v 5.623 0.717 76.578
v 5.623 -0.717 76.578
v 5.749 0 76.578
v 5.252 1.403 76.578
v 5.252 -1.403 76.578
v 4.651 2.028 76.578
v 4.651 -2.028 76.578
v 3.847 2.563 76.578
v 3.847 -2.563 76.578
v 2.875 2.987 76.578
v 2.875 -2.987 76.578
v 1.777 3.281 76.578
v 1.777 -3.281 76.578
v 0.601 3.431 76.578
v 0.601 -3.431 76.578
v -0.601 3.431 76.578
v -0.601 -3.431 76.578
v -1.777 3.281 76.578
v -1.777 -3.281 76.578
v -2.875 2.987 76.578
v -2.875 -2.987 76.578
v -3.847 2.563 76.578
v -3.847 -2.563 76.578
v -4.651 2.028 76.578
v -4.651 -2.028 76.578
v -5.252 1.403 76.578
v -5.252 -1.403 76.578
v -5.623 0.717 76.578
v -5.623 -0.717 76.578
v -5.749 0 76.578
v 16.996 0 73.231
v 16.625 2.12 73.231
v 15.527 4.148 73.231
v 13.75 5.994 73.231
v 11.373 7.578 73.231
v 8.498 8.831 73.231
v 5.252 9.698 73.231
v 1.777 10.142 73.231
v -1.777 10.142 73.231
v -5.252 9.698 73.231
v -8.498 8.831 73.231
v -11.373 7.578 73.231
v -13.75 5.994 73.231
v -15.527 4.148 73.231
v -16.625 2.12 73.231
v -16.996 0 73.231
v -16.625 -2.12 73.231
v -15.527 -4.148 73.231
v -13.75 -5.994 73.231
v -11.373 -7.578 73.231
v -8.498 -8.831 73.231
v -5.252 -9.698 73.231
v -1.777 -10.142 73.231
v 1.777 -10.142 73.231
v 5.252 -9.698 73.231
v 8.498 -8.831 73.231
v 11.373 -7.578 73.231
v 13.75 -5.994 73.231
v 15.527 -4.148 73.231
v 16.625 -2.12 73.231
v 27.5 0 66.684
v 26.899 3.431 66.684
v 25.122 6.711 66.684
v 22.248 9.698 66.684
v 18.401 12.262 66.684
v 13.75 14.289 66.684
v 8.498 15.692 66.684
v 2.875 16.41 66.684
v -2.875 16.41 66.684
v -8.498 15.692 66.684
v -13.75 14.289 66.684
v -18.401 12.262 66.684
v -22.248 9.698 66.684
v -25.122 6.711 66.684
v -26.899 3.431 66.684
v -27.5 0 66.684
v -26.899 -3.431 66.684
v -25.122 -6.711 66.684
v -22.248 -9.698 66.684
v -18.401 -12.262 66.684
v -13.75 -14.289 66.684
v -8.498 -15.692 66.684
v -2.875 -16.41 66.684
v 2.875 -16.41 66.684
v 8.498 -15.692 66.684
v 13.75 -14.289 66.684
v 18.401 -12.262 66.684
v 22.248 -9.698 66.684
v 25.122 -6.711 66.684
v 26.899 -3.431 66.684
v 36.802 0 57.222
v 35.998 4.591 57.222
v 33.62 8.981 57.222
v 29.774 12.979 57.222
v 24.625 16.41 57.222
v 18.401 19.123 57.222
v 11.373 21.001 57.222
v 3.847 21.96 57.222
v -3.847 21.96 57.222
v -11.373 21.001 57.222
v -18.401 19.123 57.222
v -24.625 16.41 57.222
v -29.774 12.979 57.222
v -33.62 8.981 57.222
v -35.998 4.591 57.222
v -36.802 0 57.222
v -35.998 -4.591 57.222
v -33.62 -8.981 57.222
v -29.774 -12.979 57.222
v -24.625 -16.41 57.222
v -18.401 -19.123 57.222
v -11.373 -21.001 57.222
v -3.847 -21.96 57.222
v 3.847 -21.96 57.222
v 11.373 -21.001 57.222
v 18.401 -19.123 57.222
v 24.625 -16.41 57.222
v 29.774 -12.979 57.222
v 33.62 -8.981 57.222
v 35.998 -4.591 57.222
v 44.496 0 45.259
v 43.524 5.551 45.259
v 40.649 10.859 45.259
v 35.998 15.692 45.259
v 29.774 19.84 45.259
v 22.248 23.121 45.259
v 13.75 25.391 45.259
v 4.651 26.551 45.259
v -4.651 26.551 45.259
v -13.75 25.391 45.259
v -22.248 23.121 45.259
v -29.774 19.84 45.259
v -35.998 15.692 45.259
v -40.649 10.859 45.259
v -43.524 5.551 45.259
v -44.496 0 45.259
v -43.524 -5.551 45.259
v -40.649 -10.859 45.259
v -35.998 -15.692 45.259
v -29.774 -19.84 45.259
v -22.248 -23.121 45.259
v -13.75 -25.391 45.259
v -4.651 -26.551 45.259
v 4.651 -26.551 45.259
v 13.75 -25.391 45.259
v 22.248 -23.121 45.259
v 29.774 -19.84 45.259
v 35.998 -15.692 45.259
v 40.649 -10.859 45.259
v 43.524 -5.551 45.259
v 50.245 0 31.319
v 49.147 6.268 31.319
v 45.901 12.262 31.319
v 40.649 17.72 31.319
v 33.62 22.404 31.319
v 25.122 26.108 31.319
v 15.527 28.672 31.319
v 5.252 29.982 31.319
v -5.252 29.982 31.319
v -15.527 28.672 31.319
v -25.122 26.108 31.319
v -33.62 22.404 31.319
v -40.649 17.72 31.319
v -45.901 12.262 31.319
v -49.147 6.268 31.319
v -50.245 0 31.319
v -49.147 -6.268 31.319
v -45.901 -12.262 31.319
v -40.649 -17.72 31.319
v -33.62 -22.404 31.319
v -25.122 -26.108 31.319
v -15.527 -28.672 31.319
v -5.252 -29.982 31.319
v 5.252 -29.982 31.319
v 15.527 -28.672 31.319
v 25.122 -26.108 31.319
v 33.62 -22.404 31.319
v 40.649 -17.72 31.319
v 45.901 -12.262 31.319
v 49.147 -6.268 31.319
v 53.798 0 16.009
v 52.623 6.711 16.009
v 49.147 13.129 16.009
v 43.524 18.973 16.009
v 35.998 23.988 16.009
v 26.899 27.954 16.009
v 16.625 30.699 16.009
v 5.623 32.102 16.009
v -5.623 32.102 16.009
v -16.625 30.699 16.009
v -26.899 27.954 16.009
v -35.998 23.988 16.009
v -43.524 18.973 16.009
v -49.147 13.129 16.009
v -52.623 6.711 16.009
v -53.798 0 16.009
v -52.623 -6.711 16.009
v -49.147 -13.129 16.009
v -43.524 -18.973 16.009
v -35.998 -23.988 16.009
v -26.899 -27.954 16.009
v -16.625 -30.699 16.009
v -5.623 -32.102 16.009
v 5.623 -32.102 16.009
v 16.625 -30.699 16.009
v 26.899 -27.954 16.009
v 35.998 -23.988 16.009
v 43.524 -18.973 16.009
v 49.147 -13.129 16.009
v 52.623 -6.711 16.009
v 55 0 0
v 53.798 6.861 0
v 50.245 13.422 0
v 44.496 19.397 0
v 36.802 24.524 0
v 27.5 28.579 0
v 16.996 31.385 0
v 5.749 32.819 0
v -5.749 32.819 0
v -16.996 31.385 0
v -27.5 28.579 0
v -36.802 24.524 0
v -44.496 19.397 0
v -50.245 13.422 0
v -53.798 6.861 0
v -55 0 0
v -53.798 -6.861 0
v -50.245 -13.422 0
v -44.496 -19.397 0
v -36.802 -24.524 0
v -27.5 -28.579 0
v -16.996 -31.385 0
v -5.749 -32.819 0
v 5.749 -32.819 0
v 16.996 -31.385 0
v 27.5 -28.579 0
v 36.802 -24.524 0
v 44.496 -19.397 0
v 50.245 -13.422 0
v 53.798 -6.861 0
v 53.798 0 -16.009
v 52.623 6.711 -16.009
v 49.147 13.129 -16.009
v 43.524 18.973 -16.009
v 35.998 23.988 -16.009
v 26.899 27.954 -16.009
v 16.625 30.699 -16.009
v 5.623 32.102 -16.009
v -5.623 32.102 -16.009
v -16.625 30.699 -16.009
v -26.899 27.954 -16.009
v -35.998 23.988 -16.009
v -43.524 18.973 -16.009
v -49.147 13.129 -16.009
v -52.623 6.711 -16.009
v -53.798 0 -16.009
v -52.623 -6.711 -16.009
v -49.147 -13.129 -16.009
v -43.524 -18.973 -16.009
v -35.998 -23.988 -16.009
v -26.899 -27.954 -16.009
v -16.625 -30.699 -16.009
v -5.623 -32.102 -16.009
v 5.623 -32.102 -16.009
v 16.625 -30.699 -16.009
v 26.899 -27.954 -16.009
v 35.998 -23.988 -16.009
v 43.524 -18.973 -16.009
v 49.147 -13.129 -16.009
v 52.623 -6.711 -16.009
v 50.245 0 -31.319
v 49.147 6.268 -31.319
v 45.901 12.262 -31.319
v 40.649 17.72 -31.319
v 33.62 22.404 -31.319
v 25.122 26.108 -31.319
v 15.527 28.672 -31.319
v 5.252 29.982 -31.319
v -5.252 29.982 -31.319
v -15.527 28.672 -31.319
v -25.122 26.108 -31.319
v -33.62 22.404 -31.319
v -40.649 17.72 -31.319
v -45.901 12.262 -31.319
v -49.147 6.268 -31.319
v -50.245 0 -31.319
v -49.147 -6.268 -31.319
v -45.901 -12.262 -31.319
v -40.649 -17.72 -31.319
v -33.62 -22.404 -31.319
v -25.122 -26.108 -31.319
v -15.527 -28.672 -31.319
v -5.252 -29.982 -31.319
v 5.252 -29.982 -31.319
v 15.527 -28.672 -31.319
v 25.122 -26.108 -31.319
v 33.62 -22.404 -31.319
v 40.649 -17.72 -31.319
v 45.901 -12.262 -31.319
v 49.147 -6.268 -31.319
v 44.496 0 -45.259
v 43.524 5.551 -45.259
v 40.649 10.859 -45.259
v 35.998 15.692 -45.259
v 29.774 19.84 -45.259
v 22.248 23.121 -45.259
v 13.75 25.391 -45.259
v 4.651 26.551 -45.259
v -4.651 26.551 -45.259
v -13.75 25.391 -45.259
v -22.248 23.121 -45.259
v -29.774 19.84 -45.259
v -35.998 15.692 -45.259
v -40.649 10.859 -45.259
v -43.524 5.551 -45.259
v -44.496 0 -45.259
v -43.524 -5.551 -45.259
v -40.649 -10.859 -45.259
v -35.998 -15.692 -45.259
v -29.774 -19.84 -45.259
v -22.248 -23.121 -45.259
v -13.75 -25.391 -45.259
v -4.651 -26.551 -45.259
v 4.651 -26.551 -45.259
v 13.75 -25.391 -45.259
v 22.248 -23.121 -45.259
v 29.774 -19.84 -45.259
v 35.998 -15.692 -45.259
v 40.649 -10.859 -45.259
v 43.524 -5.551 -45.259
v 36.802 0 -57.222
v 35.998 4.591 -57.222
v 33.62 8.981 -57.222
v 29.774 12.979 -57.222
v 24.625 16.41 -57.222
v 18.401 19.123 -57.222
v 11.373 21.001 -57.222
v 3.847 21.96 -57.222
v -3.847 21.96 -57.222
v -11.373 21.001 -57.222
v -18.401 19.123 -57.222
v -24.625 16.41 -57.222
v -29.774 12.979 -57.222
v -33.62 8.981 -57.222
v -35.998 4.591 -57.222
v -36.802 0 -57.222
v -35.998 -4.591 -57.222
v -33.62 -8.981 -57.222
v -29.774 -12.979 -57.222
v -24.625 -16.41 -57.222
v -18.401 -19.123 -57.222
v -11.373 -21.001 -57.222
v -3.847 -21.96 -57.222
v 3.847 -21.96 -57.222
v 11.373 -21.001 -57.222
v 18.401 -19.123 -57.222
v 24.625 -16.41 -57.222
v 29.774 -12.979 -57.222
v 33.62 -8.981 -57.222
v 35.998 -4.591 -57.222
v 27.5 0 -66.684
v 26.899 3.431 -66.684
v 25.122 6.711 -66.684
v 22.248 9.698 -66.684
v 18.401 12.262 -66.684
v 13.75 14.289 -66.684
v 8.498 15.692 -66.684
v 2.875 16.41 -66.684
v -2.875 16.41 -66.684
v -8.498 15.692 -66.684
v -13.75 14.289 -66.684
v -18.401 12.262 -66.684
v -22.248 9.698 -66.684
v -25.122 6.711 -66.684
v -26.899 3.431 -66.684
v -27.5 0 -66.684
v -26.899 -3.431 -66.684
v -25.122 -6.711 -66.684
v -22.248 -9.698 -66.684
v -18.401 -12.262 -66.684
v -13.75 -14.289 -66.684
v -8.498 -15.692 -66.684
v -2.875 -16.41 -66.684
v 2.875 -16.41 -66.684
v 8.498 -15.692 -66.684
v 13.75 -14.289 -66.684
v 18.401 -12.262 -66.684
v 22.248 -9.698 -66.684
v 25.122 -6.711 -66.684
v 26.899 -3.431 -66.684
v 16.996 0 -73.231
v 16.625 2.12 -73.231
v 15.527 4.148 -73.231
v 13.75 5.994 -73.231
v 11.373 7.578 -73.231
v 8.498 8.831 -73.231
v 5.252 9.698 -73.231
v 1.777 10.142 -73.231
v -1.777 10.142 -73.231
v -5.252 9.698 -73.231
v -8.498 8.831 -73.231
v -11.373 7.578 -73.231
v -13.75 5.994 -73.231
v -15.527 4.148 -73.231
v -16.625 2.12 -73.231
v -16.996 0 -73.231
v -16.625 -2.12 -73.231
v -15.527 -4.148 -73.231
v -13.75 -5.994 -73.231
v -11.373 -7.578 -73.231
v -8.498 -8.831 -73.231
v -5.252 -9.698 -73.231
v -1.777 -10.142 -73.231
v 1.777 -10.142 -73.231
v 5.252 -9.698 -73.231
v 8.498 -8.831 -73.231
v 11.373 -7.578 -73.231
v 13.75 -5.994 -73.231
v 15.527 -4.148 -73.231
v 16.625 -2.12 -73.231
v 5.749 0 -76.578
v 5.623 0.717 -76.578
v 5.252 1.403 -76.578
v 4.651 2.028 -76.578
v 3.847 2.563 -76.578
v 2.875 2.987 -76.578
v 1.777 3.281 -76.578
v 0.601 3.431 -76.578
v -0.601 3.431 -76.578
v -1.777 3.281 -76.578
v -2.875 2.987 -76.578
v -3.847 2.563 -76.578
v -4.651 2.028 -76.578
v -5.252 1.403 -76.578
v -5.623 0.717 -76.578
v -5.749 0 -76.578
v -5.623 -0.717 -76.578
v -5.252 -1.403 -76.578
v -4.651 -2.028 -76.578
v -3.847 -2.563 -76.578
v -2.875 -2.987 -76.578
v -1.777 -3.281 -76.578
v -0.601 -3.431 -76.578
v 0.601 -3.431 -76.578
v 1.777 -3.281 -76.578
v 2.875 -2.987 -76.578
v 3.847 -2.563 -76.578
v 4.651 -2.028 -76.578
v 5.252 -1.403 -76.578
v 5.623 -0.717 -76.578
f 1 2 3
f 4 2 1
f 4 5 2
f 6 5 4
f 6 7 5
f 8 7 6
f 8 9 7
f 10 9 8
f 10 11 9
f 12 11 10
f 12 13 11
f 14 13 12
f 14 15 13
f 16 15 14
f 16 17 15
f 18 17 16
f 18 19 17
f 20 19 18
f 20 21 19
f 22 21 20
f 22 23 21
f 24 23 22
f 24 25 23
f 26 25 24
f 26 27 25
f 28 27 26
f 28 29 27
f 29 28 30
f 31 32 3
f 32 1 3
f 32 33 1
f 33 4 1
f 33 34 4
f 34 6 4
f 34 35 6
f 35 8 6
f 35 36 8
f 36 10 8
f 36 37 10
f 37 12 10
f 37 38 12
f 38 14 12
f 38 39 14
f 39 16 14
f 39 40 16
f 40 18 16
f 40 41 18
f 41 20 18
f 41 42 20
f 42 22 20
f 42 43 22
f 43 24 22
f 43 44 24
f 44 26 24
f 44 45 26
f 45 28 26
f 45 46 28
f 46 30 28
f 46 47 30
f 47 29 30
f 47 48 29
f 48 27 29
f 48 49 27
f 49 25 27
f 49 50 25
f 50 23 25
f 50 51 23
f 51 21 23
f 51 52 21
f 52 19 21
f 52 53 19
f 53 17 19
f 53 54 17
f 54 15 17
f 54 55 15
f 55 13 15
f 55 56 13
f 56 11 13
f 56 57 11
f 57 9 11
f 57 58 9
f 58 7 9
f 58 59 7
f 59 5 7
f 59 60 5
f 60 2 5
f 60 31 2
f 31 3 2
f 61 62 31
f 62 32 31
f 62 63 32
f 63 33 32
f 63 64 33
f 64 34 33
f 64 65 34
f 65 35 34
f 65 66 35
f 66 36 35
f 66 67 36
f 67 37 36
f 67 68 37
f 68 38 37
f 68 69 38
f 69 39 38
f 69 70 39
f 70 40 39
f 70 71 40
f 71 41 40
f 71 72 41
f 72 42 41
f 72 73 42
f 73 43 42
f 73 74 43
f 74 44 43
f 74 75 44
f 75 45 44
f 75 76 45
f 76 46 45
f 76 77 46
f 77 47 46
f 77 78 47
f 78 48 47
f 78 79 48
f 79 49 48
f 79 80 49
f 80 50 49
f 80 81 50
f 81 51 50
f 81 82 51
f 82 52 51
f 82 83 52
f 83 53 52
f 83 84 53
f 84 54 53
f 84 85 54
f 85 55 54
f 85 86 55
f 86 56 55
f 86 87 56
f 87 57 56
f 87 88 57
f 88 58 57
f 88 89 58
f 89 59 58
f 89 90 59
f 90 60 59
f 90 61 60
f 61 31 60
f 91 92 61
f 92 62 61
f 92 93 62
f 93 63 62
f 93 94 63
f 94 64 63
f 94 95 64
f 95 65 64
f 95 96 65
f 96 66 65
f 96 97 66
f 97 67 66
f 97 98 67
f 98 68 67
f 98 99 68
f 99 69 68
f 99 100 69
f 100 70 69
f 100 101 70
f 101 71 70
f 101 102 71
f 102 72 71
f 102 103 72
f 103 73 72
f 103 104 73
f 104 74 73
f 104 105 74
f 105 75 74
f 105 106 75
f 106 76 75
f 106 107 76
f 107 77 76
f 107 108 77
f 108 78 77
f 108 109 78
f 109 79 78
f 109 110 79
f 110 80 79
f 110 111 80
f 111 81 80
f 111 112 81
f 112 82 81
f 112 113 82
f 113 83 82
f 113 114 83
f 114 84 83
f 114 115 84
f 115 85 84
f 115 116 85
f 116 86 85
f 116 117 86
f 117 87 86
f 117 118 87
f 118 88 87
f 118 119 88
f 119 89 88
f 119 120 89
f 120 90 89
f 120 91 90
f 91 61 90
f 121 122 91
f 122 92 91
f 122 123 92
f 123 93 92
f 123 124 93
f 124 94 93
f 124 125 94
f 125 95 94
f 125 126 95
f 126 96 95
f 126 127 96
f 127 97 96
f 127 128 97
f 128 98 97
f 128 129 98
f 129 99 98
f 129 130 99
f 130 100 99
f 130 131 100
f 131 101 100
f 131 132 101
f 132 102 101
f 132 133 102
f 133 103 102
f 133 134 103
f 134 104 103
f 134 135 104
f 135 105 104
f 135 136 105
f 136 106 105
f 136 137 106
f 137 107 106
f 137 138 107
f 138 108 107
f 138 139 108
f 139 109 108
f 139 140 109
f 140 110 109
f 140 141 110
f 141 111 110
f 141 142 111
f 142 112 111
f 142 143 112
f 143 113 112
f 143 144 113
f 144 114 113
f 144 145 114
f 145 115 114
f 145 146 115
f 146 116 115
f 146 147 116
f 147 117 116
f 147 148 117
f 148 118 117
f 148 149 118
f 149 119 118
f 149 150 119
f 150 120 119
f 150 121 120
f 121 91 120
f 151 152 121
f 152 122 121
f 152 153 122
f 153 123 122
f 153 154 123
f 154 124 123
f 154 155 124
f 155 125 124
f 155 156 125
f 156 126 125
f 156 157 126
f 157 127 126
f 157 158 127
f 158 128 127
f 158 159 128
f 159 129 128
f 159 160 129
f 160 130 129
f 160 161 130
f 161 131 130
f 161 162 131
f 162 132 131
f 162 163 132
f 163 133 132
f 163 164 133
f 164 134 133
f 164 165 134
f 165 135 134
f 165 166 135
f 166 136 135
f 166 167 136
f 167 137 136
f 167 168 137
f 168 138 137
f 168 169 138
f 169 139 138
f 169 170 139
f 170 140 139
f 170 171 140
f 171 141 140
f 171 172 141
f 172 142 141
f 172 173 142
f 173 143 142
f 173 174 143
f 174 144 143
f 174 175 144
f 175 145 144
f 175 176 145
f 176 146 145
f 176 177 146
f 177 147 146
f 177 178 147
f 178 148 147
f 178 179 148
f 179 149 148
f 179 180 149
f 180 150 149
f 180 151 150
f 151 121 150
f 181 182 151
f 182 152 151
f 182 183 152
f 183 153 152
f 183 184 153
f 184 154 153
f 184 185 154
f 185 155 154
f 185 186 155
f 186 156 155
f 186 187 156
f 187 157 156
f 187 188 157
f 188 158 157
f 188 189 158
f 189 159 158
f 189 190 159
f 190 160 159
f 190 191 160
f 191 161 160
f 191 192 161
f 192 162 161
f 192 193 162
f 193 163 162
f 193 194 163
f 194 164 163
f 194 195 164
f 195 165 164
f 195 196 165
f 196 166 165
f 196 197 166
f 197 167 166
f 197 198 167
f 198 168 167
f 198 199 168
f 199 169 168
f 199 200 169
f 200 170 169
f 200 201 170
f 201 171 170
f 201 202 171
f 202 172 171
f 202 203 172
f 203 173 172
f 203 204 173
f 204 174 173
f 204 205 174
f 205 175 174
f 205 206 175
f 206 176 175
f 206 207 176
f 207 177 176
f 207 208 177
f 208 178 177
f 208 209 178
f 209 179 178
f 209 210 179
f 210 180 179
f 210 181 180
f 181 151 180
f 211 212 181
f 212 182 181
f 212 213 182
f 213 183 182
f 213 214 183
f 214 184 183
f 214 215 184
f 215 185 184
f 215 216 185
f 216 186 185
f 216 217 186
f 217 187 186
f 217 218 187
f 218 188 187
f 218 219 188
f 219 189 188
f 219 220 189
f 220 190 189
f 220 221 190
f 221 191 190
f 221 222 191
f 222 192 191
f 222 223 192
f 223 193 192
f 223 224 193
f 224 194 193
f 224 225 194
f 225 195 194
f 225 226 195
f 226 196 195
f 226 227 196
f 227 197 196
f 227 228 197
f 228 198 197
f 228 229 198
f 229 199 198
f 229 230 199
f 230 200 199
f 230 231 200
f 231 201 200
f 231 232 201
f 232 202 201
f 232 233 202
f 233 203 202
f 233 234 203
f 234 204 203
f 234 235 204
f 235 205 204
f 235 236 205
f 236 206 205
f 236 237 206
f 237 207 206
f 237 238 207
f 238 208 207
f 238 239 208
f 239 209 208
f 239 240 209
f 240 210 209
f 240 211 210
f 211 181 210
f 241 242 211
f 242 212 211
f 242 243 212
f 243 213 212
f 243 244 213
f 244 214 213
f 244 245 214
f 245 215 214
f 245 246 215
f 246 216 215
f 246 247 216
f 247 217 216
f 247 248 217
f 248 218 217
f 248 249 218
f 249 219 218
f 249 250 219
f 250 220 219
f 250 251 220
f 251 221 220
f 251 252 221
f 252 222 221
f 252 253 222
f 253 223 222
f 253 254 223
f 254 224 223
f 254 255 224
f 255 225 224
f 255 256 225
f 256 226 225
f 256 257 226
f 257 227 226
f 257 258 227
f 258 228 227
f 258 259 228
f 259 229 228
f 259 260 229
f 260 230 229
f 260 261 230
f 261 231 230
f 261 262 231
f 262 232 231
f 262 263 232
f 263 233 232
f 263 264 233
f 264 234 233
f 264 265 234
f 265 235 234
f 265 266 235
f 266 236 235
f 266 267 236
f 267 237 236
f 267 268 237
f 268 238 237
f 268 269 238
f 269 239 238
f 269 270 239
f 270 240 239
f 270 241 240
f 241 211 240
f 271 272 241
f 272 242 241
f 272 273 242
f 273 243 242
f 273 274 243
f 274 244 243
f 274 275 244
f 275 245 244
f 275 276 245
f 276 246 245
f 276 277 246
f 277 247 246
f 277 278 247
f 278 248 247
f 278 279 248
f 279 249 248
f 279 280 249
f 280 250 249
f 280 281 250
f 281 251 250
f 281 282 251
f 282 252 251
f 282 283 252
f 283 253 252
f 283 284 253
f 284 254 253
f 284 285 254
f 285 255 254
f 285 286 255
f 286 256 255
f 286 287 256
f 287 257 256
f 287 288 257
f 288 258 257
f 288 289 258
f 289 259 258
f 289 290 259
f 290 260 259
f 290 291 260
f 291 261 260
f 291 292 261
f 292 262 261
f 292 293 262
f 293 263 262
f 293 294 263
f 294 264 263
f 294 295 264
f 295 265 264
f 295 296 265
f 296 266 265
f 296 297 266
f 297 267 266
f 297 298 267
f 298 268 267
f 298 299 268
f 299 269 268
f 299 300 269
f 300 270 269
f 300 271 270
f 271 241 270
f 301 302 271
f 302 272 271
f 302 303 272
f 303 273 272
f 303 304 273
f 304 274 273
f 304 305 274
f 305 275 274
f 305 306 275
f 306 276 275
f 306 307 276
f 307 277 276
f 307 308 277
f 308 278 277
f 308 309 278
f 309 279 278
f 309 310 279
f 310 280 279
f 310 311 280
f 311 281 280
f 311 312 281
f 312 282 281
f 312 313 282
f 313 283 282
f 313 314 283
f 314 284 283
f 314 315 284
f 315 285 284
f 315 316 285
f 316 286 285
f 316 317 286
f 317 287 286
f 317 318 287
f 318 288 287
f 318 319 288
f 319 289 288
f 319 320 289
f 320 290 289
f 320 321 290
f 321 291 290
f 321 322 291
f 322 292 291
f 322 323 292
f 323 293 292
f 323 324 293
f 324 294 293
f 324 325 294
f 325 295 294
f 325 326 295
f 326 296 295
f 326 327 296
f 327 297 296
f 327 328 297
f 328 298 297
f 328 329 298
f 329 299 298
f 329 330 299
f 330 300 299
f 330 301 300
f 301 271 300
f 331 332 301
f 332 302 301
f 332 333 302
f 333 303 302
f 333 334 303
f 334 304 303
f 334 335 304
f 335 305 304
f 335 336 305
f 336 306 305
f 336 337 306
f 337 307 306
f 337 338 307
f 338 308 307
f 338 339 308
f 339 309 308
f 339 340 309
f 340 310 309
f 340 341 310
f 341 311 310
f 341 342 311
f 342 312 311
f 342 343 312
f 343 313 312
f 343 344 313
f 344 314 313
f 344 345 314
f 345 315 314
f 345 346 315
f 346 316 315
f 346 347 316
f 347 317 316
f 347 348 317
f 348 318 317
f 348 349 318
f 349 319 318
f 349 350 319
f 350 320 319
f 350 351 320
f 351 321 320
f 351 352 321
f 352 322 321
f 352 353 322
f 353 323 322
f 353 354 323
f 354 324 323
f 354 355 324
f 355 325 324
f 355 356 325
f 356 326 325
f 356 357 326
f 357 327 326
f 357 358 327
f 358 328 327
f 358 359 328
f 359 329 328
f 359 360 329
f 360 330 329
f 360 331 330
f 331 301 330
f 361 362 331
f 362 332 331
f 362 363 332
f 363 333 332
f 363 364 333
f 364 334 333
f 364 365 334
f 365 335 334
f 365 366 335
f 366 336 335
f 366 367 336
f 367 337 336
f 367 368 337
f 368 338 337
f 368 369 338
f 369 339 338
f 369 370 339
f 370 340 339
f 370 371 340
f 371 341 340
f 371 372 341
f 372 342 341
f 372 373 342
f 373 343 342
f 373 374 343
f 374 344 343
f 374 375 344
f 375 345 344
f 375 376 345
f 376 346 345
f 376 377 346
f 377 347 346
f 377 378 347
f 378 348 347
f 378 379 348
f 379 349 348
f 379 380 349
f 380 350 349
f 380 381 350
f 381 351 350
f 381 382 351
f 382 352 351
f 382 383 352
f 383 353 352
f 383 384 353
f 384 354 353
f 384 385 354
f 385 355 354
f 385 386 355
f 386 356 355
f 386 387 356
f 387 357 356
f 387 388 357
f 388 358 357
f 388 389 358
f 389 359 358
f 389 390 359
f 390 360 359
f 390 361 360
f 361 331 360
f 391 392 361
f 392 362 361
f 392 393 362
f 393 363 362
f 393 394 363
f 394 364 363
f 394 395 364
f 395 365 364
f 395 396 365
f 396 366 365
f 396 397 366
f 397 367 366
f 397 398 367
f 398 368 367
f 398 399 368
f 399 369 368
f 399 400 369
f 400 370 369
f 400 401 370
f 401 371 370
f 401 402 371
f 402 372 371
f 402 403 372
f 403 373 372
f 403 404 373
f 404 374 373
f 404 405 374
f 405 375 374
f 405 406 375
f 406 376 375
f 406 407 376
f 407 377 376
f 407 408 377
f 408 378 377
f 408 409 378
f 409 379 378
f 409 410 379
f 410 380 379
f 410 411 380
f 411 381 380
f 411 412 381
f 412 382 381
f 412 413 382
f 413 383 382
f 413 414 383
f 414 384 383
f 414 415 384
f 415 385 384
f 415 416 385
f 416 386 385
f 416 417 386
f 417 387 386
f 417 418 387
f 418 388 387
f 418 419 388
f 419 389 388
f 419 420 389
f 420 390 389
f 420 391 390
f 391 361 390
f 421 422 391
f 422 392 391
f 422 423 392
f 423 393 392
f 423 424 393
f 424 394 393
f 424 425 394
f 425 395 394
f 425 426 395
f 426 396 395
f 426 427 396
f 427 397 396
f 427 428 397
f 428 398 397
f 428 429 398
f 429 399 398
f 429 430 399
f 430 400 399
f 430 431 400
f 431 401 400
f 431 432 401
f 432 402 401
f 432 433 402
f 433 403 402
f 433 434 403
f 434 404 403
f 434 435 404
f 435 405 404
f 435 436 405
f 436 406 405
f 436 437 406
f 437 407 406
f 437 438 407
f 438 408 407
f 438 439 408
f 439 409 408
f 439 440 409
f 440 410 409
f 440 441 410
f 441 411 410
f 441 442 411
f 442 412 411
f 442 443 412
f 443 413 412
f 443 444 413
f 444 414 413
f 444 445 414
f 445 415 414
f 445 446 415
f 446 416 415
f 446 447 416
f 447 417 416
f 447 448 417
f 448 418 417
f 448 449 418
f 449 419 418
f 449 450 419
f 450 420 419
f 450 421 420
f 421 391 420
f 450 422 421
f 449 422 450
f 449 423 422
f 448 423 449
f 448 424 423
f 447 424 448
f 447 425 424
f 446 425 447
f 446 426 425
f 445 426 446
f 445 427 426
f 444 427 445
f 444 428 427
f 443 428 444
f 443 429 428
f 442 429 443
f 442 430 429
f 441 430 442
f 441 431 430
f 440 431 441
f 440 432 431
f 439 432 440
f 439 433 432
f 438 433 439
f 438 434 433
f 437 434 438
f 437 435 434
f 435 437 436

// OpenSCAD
// Generated by SolidPython 1.0.1 on 2020-07-29 00:46:46


scale(v = [5, 3, 7]) {
	sphere(r = 11);
}
/***********************************************
*********      SolidPython code:      **********
************************************************
 
# import packages: SolidPython
from solid import *
from solid.utils import *
from itertools import chain, combinations, permutations


class Resize:

    def __init__(self, scad_file):
        self.scad_file = scad_file
        #self.scad_file = import_scad(scad_file)
        # cone/cylinder param:
        self.r1 = 0
        self.r2 = 0
        self.h = 0
        # rectangular prism param:
        self.w = 0
        self.l = 0
        # ellipse param:
        self.r = 0

    # import OpenScad code (file name corresponds to shape)


    # classify shape + parameters
    def assign(self, param1, param2, param3):
        if self.scad_file == 'cone.scad':
            self.r1 = param1
            self.r2 = param2
            self.h = param3
        elif self.scad_file == 'cylinder.scad':
            self.r1 = param1
            self.r2 = param2
            self.h = param3
        elif self.scad_file == 'rectangularPrism.scad':
            self.h = param1
            self.l = param2
            self.w = param3
        else:
            self.r = param1
            self.h = param2

    # resize parameters
    def iterate(self):
        x = range(3, 20, 2)
        i = 1
        if self.scad_file == 'cone.scad':
            tempList = list(permutations(x, 2))
            for temp in tempList:
                param1 = temp[0]
                param2 = temp[1]
                filepath = 'produced_scad_files/' + 'cone' + str(param1) + '_' + str(param2) + '_' + '.scad'
                scad_render_to_file(cylinder(h=param1, r1=param2, r2=0), filepath)

        elif self.scad_file == 'cylinder.scad':
            tempList = list(permutations(x, 3))
            for temp in tempList:
                param1 = temp[0]
                param2 = temp[1]
                filepath = 'produced_scad_files/' + 'cylinder' + str(param1) + '_' + str(param2) + '_' + '.scad'
                scad_render_to_file(cylinder(h=param1, r1=param2, r2=param2), filepath)

        elif self.scad_file == 'rectangularPrism.scad':
            tempList = list(permutations(x, 3))
            for temp in tempList:
                param1 = temp[0]
                param2 = temp[1]
                param3 = temp[2]
                filepath = 'produced_scad_files/' + 'rectangularPrism' + str(param1) + '_' + str(param2) + '_' + str(
                    param3) + '.scad'
                scad_render_to_file(cube(size=(param1, param2, param3)), filepath)

        elif self.scad_file == 'ellipse.scad':
            tempList = list(permutations(x, 4))
            for temp in tempList:
                param1 = temp[0]
                param2 = temp[1]
                param3 = temp[2]
                param4 = temp[3]
                filepath = 'produced_scad_files/' + 'ellipse' + str(param1) + '_' + str(param2) + '_' + str(param3) + '_' + str(param4) + '.scad'
                scad_render_to_file(scale([param1, param2, param3])(sphere(r=param4)), filepath)

    def render_to_scadfile(self):
        scad_render_to_file(scad, 'example.scad') 
 
************************************************/
